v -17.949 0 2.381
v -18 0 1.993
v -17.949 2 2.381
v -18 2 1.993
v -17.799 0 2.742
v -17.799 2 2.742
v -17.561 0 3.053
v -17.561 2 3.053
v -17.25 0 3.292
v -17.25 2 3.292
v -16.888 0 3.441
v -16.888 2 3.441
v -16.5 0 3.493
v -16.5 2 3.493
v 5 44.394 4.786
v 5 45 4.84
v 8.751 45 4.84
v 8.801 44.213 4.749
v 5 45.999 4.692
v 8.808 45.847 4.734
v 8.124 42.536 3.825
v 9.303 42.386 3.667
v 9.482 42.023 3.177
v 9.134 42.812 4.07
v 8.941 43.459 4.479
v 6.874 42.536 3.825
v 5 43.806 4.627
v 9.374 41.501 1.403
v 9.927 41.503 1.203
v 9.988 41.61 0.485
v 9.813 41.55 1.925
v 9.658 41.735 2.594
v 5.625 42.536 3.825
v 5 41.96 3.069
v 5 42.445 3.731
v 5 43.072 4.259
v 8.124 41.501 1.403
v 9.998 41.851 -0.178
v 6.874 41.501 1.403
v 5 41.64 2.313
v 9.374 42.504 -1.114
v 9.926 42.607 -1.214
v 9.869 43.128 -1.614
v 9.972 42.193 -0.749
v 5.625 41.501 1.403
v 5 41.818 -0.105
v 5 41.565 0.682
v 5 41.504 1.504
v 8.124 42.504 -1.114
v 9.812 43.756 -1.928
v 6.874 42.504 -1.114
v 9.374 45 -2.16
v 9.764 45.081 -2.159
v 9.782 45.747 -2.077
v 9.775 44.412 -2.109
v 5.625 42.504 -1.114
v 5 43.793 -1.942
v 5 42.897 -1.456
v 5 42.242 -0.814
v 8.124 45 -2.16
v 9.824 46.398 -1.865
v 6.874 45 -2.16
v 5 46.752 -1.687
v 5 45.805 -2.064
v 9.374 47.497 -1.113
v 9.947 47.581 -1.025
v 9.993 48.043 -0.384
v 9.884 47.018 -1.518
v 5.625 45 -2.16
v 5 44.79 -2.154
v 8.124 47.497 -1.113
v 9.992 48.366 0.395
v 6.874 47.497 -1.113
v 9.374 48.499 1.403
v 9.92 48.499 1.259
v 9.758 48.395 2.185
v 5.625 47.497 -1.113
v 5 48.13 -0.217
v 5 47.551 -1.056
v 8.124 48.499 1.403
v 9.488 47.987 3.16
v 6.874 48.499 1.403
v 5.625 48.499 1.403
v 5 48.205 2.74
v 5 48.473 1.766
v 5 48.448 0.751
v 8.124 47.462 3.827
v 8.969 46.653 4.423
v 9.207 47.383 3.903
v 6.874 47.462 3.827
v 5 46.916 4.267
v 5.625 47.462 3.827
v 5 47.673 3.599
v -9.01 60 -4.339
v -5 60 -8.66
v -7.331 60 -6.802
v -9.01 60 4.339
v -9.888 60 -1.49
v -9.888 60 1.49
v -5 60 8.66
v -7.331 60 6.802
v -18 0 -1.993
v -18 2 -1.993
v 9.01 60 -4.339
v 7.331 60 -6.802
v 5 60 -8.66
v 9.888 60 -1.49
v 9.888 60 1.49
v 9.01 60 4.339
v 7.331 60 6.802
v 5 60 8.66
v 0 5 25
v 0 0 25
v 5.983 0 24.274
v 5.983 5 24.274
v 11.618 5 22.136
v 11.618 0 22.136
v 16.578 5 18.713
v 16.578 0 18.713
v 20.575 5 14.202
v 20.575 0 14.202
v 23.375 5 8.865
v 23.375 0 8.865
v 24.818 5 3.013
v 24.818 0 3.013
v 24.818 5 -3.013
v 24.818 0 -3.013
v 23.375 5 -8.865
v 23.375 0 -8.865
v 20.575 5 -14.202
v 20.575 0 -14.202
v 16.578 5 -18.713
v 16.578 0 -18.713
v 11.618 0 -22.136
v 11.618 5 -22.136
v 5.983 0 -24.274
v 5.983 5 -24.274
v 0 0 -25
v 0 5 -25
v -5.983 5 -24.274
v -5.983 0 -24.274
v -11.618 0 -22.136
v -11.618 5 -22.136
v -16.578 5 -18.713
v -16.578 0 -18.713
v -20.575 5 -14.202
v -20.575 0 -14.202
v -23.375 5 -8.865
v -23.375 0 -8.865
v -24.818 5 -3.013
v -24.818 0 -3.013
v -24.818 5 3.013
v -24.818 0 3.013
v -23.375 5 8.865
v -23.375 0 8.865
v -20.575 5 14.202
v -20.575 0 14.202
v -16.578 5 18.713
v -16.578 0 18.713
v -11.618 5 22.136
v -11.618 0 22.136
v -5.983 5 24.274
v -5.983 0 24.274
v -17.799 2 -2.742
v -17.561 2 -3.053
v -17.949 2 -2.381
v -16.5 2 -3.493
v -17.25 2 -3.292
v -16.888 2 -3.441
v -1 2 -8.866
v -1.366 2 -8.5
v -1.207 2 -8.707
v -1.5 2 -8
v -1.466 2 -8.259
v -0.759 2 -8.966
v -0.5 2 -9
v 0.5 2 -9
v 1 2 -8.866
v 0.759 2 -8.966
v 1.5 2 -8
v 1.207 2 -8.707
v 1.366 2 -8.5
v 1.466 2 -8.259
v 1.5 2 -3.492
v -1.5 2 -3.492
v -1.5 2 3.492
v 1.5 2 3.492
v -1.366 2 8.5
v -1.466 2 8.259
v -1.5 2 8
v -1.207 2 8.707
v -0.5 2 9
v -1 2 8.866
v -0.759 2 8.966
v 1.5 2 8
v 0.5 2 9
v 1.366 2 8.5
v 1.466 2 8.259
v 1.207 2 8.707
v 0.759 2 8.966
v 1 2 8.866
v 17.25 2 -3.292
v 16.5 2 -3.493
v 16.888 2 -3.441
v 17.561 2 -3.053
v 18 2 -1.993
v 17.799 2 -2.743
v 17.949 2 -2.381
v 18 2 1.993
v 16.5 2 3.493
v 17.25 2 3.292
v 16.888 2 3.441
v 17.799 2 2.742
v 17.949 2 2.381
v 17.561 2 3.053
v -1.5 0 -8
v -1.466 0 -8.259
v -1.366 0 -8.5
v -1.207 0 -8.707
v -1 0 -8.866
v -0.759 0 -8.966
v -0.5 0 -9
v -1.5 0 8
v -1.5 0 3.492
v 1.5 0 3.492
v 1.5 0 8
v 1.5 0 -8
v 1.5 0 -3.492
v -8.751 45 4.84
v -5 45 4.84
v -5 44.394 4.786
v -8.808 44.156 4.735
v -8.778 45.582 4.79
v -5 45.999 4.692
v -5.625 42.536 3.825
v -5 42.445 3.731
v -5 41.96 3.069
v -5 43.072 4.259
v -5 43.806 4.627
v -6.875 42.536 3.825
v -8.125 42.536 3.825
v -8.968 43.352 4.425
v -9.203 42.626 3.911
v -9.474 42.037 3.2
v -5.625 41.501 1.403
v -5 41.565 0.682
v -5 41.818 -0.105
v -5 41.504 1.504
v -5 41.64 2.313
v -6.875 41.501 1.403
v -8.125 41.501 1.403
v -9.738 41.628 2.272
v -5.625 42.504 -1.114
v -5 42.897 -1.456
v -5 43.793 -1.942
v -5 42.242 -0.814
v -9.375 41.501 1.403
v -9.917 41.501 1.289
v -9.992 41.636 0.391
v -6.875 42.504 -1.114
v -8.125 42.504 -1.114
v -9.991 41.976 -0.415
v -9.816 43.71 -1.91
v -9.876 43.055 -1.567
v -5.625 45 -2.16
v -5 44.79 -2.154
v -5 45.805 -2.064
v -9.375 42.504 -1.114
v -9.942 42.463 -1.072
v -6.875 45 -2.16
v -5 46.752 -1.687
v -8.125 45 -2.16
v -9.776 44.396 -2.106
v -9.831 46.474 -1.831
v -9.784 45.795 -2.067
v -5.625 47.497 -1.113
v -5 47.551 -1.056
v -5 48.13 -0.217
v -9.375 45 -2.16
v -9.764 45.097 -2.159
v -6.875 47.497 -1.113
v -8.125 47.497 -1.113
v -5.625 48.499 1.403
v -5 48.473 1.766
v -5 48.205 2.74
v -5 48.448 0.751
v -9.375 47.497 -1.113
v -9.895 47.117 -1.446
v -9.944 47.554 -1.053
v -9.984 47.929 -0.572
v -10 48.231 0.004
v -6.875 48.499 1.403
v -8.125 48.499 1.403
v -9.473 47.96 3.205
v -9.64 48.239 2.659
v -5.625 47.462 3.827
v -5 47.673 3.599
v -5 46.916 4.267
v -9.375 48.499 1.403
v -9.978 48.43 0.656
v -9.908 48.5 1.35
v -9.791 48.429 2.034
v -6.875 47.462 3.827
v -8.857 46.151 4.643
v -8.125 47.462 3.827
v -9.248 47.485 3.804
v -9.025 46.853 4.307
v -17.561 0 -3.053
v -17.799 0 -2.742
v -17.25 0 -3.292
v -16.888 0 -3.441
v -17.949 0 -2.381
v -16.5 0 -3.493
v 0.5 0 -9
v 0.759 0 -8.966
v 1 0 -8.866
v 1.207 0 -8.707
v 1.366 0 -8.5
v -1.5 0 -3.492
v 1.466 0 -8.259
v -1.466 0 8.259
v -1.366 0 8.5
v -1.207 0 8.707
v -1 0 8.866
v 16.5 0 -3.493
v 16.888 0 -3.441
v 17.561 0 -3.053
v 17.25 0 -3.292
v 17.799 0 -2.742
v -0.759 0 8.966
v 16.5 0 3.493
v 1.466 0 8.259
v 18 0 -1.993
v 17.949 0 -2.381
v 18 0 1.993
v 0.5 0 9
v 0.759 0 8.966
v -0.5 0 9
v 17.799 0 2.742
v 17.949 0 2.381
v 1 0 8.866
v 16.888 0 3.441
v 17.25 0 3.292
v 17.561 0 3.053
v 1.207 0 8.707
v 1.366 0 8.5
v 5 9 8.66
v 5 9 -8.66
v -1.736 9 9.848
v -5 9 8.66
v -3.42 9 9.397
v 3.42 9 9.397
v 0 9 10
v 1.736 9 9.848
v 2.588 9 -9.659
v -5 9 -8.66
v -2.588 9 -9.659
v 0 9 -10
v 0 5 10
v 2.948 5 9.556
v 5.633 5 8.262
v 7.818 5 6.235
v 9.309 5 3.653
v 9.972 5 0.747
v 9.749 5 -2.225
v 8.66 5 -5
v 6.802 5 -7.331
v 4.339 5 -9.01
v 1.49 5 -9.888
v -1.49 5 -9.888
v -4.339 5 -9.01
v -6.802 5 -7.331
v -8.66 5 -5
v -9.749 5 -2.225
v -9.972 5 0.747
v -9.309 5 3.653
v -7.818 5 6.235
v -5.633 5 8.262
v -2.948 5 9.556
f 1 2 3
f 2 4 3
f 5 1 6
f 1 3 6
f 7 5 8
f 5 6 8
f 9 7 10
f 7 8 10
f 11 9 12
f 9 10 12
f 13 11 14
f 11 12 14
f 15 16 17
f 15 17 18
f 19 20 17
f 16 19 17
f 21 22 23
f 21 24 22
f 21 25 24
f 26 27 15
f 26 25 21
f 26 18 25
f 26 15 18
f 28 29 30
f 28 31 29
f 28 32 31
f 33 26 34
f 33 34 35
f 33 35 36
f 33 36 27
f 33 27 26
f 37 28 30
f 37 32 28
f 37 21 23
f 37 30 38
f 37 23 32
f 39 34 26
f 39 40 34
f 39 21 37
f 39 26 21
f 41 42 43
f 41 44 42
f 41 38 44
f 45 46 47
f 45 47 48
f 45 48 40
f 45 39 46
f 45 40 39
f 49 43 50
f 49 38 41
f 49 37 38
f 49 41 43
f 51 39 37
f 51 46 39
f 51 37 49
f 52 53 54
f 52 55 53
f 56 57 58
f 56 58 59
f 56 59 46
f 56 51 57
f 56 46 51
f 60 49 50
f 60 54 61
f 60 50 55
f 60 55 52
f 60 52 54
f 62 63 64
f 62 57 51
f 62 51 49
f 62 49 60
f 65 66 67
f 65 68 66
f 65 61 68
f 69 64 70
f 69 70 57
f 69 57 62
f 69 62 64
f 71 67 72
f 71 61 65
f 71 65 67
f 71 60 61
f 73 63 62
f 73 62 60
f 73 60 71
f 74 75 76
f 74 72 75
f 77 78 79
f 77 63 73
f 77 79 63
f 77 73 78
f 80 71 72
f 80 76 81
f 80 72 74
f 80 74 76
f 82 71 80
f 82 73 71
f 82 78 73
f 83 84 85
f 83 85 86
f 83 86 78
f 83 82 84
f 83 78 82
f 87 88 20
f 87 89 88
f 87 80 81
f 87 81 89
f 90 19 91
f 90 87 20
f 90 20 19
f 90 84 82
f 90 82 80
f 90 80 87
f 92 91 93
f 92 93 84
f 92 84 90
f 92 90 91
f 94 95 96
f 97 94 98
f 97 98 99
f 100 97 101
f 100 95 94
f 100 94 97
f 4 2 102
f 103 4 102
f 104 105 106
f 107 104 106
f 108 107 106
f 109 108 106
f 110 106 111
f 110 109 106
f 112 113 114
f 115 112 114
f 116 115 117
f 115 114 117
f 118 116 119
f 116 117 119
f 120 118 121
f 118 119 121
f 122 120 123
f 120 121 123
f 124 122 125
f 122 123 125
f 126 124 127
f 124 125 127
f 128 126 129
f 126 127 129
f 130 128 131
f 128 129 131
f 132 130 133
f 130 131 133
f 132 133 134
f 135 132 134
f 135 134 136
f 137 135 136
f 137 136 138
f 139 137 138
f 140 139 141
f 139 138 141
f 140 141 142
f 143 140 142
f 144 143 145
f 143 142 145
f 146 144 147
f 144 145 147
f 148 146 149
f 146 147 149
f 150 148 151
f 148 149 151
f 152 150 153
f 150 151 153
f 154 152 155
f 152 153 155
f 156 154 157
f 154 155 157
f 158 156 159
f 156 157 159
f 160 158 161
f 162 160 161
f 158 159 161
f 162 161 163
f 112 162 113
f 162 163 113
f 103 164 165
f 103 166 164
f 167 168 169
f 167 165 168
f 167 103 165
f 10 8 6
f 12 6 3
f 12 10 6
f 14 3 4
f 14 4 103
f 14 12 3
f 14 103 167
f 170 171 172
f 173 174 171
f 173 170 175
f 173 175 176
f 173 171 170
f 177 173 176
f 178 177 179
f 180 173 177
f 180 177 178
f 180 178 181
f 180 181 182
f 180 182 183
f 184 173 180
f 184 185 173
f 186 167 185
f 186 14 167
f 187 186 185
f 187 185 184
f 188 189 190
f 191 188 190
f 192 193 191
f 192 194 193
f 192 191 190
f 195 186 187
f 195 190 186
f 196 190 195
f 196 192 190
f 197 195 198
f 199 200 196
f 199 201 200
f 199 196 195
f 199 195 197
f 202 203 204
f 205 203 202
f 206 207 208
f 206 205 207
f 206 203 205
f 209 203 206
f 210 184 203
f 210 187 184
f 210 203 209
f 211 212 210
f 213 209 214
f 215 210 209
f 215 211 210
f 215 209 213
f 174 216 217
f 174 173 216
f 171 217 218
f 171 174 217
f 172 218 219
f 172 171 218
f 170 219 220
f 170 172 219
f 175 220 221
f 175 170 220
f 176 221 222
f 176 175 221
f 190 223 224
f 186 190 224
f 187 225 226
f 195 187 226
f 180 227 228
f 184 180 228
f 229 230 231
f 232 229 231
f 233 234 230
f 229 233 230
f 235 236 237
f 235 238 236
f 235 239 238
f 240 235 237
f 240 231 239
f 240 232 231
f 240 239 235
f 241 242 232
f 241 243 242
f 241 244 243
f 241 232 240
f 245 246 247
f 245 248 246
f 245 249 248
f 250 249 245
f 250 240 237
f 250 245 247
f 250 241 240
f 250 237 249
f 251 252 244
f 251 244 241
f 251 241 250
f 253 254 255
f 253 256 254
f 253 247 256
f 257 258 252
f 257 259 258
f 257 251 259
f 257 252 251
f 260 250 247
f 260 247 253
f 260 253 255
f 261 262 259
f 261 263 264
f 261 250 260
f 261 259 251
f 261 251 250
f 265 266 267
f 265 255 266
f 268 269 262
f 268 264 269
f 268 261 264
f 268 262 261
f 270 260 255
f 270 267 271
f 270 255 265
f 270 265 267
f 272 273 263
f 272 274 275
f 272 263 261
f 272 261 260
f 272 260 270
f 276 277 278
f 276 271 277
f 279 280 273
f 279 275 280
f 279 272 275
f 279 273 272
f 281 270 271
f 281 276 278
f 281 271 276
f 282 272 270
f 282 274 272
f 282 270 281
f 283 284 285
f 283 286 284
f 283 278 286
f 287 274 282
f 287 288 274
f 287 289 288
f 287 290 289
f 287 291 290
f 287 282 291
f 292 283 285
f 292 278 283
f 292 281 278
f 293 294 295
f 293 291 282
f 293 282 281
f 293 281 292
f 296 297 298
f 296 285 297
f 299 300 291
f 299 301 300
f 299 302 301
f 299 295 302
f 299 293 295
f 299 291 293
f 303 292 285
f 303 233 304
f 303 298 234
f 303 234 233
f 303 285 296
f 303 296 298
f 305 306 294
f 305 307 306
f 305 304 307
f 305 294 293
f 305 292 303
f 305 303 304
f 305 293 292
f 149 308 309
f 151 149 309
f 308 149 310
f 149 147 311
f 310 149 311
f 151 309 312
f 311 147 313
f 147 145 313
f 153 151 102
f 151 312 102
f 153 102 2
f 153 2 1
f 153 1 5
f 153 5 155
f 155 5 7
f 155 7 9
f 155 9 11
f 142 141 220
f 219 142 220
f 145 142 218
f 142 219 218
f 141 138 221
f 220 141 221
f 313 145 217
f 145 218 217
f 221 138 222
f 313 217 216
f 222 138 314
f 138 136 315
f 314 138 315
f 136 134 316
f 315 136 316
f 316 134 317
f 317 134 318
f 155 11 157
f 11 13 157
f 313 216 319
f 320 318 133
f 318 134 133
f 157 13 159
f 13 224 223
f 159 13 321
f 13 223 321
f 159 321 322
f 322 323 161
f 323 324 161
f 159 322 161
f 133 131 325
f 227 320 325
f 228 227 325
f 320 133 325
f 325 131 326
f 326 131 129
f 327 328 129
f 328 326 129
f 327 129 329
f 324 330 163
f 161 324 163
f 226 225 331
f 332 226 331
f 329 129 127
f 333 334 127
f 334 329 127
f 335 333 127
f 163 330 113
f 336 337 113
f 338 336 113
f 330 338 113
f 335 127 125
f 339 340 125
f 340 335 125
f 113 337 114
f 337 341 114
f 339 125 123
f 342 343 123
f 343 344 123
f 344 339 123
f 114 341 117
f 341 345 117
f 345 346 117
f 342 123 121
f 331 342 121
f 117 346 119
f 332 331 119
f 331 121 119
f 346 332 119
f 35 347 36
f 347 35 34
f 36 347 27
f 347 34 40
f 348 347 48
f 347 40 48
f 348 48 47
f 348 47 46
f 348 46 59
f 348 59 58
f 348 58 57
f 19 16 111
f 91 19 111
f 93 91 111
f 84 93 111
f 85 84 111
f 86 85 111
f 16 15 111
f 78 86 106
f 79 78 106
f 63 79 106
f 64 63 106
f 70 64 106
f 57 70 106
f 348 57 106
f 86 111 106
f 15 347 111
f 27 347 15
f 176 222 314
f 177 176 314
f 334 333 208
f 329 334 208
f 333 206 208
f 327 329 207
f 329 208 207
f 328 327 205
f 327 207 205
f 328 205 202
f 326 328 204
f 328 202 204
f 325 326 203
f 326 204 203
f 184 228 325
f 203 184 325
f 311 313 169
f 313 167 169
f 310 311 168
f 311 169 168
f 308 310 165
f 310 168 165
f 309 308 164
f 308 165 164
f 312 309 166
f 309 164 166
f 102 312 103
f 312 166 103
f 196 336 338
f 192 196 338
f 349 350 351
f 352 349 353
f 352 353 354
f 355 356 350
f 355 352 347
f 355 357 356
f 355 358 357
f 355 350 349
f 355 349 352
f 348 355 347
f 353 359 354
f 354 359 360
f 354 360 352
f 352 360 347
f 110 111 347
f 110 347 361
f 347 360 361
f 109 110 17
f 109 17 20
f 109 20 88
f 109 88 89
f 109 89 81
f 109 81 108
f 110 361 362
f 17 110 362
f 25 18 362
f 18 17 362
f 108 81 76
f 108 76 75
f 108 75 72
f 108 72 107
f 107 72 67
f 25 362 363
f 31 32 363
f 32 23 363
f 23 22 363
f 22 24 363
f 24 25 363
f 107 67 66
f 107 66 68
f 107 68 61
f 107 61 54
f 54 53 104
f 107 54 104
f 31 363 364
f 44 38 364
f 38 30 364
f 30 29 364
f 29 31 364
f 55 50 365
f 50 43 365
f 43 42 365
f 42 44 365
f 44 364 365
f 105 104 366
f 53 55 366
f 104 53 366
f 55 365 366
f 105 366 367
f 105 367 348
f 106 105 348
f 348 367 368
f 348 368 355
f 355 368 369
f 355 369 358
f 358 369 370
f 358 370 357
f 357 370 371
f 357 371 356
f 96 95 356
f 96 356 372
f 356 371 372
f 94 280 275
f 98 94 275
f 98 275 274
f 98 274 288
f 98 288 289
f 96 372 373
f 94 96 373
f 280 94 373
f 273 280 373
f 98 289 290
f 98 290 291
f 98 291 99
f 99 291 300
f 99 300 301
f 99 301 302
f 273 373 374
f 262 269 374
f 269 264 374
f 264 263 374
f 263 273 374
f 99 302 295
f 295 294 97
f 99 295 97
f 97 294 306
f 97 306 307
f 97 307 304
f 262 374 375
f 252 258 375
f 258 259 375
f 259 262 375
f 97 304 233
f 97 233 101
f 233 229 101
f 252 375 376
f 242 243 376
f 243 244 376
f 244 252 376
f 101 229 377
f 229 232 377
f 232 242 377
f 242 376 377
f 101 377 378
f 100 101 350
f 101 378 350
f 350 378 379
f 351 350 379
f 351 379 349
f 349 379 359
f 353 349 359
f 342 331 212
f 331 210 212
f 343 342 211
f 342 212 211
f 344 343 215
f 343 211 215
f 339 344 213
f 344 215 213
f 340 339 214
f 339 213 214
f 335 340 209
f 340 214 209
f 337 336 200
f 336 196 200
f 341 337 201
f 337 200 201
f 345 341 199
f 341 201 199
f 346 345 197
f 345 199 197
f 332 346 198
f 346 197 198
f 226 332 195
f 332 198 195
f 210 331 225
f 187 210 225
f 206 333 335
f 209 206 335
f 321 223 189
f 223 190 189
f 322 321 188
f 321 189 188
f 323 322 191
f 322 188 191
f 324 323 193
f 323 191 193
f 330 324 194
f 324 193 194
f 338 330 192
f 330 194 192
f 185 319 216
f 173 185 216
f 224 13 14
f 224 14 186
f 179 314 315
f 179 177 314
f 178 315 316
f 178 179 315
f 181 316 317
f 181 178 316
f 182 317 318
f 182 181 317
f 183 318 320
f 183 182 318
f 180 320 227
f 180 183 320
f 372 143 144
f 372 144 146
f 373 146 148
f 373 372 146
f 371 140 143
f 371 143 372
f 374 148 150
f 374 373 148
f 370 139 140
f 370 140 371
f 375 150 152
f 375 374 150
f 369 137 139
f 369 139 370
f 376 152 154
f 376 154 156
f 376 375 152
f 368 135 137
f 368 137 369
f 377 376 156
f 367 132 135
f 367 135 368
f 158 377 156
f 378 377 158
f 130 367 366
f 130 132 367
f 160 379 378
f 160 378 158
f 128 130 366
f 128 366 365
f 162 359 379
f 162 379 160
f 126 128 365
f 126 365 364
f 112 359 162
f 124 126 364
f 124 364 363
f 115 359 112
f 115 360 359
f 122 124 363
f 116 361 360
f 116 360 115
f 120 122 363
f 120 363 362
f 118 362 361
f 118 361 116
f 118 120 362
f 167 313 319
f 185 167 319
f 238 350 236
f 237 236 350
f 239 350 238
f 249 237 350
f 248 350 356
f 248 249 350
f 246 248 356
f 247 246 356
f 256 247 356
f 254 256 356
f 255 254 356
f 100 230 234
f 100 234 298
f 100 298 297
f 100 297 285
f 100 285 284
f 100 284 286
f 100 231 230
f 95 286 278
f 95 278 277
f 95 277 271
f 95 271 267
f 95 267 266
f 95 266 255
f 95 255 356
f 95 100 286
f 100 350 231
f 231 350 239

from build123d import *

# Parameters (mm, degrees)
SKETCH1_R           = 10
BOSS_EXTRUDE1_DEPTH = 60
SKETCH1_5_R         = 25
SKETCH1_5_R_2       = 10
BOSS_EXTRUDE3_DEPTH = 5
SKETCH6_W           = 10
SKETCH6_H           = 20
CUT_EXTRUDE2_DEPTH  = 51
CUT_EXTRUDE3_START  = -10.0000001
CUT_EXTRUDE3_DEPTH  = 20.000000175
SKETCH8_W           = 1.5
SKETCH8_H           = 5.5075
SKETCH8_H_2         = 3.4925
SKETCH8_W_2         = 16.5
CUT_EXTRUDE4_DEPTH  = 2
FILLET2_R           = 1.5
FILLET3_R           = 1


# Read off the part's stored shape, not the designer's step: Cut-Extrude3
with BuildPart() as part:
    # Sketch1 → Boss-Extrude1 (new body)
    with BuildSketch(Plane(origin=(0, 0, 0), x_dir=(1, 0, 0), z_dir=(0, 1, 0))):
        with Locations(Location((0, 0, 0), (0, 0, 270))):
            Circle(SKETCH1_R)
    extrude(amount=BOSS_EXTRUDE1_DEPTH)

    # Sketch1<5> → Boss-Extrude3 (add)
    with BuildSketch(Plane(origin=(0, 0, 0), x_dir=(1, 0, 0), z_dir=(0, 1, 0))):
        with Locations(Location((0, 0, 0), (0, 0, 270))):
            Circle(SKETCH1_5_R)
        with Locations(Location((0, 0, 0), (0, 0, 270))):
            Circle(SKETCH1_5_R_2, mode=Mode.SUBTRACT)
    extrude(amount=BOSS_EXTRUDE3_DEPTH)

    # Sketch6 → Cut-Extrude2 (cut)
    with BuildSketch(Plane(origin=(0, 60, 0), x_dir=(1, 0, 0), z_dir=(0, 1, 0))):
        Rectangle(SKETCH6_W, SKETCH6_H)
    extrude(amount=-CUT_EXTRUDE2_DEPTH, mode=Mode.SUBTRACT)

    # Cut-Extrude3 outline → Cut-Extrude3 (cut)
    with BuildSketch(Plane(origin=(0, 0, 0), x_dir=(0, 0, -1), z_dir=(1, 0, 0)).offset(CUT_EXTRUDE3_START)):
        with BuildLine():
            add(Edge.make_bspline(
                [(-4.839745962, 45), (-4.839745962, 44.061427817), (-4.450746498, 43.166577946), (-3.199248606, 41.904517699), (-2.320388043, 41.517275442), (-0.486539081, 41.483884635), (0.452391521, 41.853887629), (1.774975913, 43.153845226), (2.16014876, 44.075410749), (2.16035927, 45.923792027), (1.777989156, 46.84346553), (0.448336969, 48.149824894), (-0.485336071, 48.515908682), (-2.319848282, 48.482962757), (-3.200529308, 48.095220586), (-4.45348427, 46.829628074), (-4.839745962, 45.938572183), (-4.839745962, 45)],
                knots=[0, 0, 0, 0, 0.125, 0.125, 0.25, 0.25, 0.375, 0.375, 0.5, 0.5, 0.625, 0.625, 0.75, 0.75, 0.875, 0.875, 1, 1, 1, 1], degree=3))
        make_face()
    extrude(amount=CUT_EXTRUDE3_DEPTH, mode=Mode.SUBTRACT)

    # Sketch8 → Cut-Extrude4 (cut)
    with BuildSketch(Plane.XZ):
        with Locations((-0.75, -6.24625)):
            Rectangle(SKETCH8_W, SKETCH8_H)
        with Locations((0.75, -6.24625)):
            Rectangle(SKETCH8_W, SKETCH8_H)
        with Locations((0.75, -1.74625)):
            Rectangle(SKETCH8_W, SKETCH8_H_2)
        with Locations((-0.75, -1.74625)):
            Rectangle(SKETCH8_W, SKETCH8_H_2)
        with Locations((9.75, -1.74625)):
            Rectangle(SKETCH8_W_2, SKETCH8_H_2)
        with Locations((9.75, 1.74625)):
            Rectangle(SKETCH8_W_2, SKETCH8_H_2)
        with Locations((0.75, 1.74625)):
            Rectangle(SKETCH8_W, SKETCH8_H_2)
        with Locations((-0.75, 1.74625)):
            Rectangle(SKETCH8_W, SKETCH8_H_2)
        with Locations((0.75, 6.24625)):
            Rectangle(SKETCH8_W, SKETCH8_H)
        with Locations((-0.75, 6.24625)):
            Rectangle(SKETCH8_W, SKETCH8_H)
        with Locations((-9.75, 1.74625)):
            Rectangle(SKETCH8_W_2, SKETCH8_H_2)
        with Locations((-9.75, -1.74625)):
            Rectangle(SKETCH8_W_2, SKETCH8_H_2)
    extrude(amount=-CUT_EXTRUDE4_DEPTH, mode=Mode.SUBTRACT)

    # Fillet2
    fillet2_edges = [part.edges().sort_by_distance(p)[0] for p in [
        (18, 1, 3.4925),
        (18, 1, -3.4925),
        (-18, 1, -3.4925),
        (-18, 1, 3.4925),
    ]]
    fillet(fillet2_edges, radius=FILLET2_R)

    # Fillet3
    fillet3_edges = [part.edges().sort_by_distance(p)[0] for p in [
        (1.5, 1, -9),
        (-1.5, 1, -9),
        (-1.5, 1, 9),
        (1.5, 1, 9),
    ]]
    fillet(fillet3_edges, radius=FILLET3_R)


solid = part.part
